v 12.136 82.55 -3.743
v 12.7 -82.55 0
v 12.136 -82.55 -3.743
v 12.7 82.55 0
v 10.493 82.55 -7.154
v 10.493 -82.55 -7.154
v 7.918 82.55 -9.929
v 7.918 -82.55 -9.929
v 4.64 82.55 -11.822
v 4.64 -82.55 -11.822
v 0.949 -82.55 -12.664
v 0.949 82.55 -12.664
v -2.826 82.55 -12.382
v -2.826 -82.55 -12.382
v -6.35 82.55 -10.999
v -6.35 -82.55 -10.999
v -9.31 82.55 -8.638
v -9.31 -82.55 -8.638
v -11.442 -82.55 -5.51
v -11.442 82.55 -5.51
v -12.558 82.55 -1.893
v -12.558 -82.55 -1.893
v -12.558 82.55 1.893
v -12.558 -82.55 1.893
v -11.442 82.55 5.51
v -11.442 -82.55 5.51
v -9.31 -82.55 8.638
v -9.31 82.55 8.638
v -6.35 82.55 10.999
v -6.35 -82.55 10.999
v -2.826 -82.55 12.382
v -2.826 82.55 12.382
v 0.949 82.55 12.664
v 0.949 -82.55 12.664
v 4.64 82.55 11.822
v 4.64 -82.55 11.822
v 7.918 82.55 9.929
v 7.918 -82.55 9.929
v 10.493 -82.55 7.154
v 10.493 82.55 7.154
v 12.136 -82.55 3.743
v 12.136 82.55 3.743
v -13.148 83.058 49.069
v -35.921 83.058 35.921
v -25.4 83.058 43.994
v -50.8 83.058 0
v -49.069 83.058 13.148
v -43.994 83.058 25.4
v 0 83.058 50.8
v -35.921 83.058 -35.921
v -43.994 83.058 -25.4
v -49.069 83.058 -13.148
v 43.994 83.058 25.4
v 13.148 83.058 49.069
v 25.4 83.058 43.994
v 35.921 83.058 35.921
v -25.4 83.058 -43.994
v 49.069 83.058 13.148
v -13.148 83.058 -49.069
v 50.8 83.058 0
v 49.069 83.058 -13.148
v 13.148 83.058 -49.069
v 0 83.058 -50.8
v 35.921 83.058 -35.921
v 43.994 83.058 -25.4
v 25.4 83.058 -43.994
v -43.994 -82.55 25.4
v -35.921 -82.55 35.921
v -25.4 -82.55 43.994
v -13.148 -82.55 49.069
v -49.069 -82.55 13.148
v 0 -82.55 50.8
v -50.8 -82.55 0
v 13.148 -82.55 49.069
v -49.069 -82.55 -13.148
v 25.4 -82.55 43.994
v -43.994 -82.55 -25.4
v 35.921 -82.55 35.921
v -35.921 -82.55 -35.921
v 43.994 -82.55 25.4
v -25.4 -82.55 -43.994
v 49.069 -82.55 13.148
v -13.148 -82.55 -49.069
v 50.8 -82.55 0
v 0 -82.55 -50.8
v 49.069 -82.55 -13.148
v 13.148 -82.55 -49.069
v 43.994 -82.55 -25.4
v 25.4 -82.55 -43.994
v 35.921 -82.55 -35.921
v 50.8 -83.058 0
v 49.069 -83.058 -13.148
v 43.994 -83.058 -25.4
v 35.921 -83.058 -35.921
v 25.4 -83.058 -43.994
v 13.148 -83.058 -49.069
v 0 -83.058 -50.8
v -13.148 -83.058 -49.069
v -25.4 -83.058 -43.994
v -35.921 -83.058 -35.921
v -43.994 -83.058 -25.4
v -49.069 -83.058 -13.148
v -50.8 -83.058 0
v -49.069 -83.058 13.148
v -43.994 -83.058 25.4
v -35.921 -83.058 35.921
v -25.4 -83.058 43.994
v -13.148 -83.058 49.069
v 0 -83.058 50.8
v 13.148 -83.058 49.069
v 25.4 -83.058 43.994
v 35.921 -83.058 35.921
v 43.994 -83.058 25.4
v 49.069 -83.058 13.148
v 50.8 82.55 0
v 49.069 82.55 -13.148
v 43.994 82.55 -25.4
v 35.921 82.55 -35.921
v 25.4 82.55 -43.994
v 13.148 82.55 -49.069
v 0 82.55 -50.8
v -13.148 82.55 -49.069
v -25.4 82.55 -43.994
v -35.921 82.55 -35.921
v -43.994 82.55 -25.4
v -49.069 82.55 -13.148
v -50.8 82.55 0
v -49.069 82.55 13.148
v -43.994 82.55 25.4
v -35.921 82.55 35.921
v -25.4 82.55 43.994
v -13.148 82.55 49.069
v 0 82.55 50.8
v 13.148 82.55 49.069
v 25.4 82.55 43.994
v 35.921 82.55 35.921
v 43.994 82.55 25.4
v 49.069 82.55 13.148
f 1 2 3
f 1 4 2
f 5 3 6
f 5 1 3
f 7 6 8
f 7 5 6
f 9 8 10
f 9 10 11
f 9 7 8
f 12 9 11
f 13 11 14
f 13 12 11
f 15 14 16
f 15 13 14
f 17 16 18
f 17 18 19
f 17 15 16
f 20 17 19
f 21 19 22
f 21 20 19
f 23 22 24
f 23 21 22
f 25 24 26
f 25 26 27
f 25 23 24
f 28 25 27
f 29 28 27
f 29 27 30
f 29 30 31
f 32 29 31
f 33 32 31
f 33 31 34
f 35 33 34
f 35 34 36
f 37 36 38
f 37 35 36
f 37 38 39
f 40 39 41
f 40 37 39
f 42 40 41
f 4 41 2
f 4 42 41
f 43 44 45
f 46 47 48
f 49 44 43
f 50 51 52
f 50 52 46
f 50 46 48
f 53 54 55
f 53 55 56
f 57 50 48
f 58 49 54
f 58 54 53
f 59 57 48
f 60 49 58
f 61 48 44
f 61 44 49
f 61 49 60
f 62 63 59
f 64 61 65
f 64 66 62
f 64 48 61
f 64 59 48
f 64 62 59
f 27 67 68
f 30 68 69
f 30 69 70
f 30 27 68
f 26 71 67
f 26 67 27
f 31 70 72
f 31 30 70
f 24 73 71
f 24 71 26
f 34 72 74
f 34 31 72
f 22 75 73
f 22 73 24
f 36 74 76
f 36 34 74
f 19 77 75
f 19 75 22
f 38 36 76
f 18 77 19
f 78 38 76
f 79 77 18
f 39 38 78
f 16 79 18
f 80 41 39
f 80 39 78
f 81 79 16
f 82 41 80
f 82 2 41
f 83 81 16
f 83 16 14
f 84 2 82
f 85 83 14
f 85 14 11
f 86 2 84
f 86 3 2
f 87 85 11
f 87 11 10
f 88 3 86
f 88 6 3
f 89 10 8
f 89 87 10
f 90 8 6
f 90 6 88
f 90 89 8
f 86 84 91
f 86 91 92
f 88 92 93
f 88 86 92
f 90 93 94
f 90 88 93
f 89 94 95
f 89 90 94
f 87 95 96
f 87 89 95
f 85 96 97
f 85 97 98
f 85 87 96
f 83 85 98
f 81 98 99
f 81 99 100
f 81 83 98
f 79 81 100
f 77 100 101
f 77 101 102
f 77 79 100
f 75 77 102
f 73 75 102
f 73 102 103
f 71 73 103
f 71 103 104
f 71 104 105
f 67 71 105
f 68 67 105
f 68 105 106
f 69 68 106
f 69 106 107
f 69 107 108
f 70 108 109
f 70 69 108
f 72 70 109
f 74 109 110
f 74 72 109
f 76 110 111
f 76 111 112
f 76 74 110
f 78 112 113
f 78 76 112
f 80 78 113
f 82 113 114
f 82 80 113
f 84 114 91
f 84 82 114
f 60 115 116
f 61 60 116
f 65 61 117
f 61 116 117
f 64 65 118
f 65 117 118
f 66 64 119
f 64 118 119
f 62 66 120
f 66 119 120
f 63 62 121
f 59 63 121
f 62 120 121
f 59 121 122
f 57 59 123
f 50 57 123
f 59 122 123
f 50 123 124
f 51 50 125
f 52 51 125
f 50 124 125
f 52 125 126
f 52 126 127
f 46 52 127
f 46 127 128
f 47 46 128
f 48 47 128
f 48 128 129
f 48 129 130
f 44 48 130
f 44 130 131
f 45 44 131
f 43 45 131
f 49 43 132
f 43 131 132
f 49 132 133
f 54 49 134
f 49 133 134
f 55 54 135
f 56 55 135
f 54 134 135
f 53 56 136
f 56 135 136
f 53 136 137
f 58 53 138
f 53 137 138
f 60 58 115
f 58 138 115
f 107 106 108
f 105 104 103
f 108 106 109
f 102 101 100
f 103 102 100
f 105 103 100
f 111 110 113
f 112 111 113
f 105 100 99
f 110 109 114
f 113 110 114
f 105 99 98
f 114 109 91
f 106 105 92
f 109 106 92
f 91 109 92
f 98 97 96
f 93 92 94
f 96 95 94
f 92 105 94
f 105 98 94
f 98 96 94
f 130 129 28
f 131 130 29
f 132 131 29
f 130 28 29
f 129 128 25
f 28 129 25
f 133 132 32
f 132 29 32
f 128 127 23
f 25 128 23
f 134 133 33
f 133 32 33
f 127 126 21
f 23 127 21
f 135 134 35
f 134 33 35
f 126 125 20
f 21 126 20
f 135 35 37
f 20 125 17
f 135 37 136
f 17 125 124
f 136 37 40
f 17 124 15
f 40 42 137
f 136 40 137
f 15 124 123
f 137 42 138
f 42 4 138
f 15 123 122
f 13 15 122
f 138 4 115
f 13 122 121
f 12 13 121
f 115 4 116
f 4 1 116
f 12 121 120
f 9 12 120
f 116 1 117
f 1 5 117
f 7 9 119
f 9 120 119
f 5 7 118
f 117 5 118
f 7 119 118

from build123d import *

# Parameters (mm, degrees)
SKETCH1_R           = 12.7
BOSS_EXTRUDE1_DEPTH = 82.55
SKETCH2_R           = 50.8
BOSS_EXTRUDE2_DEPTH = 0.508


with BuildPart() as part:
    # Sketch1 → Boss-Extrude1 (new body, symmetric)
    with BuildSketch(Plane(origin=(0, 0, 0), x_dir=(1, 0, 0), z_dir=(0, 1, 0))):
        Circle(SKETCH1_R)
    extrude(amount=BOSS_EXTRUDE1_DEPTH, both=True)

    # Sketch2 → Boss-Extrude2 (add)
    with BuildSketch(Plane(origin=(0, 82.55, 0), x_dir=(1, 0, 0), z_dir=(0, 1, 0))):
        Circle(SKETCH2_R)
    boss_extrude2 = extrude(amount=BOSS_EXTRUDE2_DEPTH)

    # Mirror1: Boss-Extrude2 across plane
    add(boss_extrude2.mirror(Plane.ZX))


solid = part.part
